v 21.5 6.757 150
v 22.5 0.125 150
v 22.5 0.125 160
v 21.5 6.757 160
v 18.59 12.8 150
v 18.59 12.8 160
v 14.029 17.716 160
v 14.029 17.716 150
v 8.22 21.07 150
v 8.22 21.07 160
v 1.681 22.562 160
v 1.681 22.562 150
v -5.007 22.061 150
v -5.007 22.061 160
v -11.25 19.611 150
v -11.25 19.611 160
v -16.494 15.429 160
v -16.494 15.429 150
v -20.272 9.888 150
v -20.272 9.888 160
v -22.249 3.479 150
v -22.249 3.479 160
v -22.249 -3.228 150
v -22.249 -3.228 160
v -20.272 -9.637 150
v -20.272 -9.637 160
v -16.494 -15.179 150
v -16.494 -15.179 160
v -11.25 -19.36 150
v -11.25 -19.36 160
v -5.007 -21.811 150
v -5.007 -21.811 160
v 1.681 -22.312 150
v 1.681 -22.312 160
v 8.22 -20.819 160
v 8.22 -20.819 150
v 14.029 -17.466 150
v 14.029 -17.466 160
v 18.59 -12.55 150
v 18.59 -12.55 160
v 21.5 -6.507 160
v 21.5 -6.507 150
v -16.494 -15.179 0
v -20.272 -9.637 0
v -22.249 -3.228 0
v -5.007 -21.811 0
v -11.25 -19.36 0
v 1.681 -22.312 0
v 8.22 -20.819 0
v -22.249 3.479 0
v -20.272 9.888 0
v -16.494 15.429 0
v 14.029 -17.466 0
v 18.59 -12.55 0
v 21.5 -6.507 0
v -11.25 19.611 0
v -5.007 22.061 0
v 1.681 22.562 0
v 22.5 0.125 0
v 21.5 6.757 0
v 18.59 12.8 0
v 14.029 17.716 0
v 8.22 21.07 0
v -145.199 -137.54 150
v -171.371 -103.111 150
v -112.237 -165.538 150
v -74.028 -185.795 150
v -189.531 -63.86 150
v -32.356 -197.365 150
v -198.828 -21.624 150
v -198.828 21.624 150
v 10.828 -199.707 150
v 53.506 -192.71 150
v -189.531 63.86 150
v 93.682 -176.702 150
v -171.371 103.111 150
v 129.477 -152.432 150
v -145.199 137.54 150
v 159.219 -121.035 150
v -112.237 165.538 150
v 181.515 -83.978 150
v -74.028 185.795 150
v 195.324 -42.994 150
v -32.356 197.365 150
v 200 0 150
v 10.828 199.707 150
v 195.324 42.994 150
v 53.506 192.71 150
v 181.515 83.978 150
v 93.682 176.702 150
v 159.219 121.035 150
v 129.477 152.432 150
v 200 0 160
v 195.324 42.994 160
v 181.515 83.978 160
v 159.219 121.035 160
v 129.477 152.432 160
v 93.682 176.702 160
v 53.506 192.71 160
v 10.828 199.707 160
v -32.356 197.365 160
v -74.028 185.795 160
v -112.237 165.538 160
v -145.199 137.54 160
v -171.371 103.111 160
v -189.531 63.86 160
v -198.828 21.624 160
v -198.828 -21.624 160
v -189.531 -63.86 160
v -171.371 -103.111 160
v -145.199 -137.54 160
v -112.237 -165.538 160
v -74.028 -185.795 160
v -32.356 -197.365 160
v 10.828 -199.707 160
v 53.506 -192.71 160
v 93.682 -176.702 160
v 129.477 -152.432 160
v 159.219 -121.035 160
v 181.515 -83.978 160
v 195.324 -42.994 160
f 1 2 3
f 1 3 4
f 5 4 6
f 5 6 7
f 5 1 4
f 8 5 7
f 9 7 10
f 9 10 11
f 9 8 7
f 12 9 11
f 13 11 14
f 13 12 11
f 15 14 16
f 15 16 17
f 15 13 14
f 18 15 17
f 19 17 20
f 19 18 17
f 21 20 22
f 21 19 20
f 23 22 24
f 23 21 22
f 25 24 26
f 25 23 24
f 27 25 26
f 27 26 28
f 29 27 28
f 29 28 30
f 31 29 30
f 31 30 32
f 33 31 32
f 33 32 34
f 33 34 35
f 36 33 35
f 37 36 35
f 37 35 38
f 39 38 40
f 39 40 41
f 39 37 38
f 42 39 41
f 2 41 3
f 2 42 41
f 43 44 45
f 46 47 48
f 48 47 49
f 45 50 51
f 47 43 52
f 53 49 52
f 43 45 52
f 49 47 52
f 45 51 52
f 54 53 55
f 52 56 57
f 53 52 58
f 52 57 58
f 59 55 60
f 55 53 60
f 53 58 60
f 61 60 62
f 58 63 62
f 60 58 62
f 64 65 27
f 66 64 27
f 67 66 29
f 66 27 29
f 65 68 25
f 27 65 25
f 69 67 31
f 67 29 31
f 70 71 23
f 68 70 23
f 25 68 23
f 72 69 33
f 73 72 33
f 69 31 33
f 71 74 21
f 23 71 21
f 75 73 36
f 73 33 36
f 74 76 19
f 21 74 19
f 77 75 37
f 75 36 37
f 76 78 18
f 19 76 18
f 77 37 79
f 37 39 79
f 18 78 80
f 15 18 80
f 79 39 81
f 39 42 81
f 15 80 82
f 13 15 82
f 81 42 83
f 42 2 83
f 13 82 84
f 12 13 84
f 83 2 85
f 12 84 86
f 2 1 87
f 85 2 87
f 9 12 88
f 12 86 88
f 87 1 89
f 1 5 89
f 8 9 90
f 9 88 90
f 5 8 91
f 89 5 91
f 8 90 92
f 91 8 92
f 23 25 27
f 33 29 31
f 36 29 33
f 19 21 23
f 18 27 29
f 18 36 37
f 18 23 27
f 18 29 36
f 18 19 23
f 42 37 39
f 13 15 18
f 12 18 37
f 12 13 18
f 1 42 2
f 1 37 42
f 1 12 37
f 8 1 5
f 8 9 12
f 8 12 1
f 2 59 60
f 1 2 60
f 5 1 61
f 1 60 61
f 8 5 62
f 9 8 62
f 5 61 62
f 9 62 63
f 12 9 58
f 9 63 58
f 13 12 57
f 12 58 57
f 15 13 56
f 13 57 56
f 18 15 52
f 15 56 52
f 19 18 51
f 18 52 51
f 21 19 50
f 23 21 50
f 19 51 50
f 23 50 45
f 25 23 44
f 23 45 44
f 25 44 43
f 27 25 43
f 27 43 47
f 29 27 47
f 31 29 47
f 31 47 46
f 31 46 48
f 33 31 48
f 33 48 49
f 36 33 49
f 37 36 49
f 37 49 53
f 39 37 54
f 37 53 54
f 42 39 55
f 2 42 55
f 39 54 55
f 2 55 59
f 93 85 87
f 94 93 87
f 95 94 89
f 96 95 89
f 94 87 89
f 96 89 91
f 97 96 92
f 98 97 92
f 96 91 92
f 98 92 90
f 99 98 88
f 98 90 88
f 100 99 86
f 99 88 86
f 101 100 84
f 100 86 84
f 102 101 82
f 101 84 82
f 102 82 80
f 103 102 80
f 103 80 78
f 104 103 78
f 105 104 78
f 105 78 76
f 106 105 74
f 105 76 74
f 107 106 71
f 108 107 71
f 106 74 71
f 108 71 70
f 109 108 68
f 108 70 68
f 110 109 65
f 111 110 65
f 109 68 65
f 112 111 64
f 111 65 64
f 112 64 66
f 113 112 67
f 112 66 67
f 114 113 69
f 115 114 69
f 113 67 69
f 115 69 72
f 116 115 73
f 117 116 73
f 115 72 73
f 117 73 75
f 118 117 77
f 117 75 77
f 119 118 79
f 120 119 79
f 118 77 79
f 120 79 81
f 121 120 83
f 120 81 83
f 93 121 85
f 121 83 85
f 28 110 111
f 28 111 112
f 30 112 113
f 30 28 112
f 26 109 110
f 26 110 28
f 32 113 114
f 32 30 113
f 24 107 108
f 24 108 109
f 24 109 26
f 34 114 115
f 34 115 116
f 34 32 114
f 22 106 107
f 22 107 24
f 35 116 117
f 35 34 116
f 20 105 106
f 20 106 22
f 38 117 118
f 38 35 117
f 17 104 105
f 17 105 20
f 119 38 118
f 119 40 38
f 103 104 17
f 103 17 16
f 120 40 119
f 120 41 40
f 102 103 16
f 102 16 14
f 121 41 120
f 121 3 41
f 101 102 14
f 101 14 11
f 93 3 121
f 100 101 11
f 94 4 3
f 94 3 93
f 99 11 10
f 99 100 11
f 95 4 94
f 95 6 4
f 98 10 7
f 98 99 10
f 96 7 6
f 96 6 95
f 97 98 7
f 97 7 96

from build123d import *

# Parameters (mm, degrees)
F0_R     = 22.5
F1_DEPTH = 150
F2_R     = 200
F2_R_2   = 22.5
F3_DEPTH = 10


with BuildPart() as f1:
    # F0 (on Top) → F1 (new body)
    with BuildSketch(Plane.XY):
        with Locations((-1e-06, 0.125199)):
            Circle(F0_R)
    extrude(amount=F1_DEPTH)


with BuildPart() as f3:
    # F2 (on face) → F3 (new body)
    with BuildSketch(Plane.XY.offset(150)):
        Circle(F2_R)
        with Locations((-1e-06, 0.125199)):
            Circle(F2_R_2, mode=Mode.SUBTRACT)
    extrude(amount=F3_DEPTH)


solid = Compound([f1.part, f3.part])
